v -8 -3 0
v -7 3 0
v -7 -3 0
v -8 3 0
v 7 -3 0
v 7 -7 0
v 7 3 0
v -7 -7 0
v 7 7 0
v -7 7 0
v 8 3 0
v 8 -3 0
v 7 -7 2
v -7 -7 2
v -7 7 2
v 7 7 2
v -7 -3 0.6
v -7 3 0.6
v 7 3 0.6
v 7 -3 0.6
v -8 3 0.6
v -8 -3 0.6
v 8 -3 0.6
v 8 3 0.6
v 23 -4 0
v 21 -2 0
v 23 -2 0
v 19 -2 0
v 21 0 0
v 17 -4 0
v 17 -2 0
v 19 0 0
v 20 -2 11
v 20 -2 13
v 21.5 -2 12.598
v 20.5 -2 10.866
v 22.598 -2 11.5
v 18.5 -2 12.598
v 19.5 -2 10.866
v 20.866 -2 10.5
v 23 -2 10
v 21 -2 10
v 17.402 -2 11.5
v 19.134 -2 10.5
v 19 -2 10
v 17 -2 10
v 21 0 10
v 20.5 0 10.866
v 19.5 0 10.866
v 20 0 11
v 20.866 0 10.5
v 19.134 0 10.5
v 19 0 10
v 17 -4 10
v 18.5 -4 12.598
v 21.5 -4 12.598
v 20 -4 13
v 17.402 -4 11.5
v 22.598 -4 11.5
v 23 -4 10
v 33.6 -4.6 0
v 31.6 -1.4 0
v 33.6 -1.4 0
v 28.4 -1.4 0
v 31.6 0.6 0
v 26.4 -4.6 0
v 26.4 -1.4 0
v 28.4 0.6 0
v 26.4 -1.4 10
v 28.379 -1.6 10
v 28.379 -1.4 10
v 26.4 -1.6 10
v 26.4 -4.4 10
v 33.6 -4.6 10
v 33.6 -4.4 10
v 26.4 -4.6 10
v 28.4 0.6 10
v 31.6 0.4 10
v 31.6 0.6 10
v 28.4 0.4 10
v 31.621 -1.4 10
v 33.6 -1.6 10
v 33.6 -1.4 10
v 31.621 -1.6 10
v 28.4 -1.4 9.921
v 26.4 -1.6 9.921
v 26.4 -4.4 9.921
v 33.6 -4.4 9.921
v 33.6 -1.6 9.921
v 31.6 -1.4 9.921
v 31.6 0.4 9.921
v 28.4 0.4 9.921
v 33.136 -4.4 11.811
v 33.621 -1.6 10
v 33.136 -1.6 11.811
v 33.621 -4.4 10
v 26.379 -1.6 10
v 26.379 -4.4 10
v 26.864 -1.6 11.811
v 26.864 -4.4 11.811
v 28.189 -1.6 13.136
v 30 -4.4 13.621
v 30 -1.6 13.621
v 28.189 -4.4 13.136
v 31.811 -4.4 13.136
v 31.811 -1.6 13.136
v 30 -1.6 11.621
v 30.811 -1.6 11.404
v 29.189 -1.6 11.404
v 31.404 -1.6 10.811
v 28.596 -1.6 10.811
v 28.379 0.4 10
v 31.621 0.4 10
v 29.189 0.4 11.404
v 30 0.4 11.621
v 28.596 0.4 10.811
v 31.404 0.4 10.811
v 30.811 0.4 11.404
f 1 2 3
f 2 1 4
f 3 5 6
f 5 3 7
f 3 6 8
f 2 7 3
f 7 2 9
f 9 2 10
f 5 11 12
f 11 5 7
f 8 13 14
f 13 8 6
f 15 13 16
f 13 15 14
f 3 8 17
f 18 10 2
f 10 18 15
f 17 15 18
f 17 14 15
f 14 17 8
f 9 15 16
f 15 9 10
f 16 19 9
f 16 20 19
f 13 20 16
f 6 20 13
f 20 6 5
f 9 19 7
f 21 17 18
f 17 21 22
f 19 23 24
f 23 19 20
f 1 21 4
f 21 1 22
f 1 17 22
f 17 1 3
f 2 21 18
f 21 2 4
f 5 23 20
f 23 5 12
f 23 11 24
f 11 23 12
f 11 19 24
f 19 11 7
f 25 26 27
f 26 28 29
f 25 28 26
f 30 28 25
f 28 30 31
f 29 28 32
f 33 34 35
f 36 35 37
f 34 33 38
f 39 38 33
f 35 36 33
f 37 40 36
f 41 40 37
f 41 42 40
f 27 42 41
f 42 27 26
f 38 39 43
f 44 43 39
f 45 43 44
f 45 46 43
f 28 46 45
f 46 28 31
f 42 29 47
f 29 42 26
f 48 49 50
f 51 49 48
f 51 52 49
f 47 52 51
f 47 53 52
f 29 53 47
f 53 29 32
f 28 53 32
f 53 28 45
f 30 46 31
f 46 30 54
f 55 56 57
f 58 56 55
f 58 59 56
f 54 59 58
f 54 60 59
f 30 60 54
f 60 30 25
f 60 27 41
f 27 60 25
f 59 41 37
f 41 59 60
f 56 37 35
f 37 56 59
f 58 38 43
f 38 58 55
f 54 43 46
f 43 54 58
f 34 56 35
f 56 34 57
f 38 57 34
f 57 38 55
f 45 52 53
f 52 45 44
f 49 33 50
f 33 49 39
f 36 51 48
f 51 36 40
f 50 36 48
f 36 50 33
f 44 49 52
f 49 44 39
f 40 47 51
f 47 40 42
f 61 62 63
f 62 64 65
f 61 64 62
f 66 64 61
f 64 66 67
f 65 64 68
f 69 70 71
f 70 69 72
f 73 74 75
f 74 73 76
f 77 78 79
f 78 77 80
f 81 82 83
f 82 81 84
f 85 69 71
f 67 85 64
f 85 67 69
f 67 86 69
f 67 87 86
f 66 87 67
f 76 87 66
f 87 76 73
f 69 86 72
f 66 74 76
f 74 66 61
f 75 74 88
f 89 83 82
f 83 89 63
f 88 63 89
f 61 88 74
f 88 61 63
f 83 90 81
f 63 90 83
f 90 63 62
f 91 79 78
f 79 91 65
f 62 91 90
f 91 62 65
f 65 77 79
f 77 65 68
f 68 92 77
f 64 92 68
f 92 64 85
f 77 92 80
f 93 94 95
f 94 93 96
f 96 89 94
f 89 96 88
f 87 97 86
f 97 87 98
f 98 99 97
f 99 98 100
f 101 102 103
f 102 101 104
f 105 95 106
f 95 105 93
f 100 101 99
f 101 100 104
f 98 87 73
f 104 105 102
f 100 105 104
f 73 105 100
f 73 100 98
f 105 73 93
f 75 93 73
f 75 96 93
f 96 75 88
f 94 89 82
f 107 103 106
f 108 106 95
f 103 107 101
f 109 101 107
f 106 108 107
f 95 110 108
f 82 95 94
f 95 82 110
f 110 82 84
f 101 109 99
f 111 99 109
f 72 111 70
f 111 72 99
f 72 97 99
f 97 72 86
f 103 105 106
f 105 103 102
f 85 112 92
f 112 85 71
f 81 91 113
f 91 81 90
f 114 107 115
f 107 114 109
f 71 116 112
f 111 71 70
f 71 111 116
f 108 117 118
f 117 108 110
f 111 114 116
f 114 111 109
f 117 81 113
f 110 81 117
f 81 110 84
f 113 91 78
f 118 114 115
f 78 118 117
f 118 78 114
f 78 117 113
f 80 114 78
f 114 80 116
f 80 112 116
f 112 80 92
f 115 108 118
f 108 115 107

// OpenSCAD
module keyswitch_hole(x=0, y=0, a=0) {
    translate([x, y, 0]) {
        rotate([0, 0, 90+a]) {
            linear_extrude(height = 2) {
            square([14, 14], center = true);
            //translate([-8, 3, 0]) square([1, 3]);
            //translate([-8, -6, 0]) square([1, 3]);
            //translate([7, 3, 0]) square([1, 3]);
            //translate([7, -6, 0]) square([1, 3]);
            }
            linear_extrude(height = 0.6) {
                translate([-3, 7]) square([6, 1]);
            translate([-3, -8]) square([6, 1]);
            }
        }
    }
}

keyswitch_hole();

module joint_male_face() {
    translate([-1, 0])
    square([2,4]);
    translate([-3, 2])
    square([6,2]);
}

module joint_male(pos=[0,0]) {
    translate(pos){
      rotate([0,0,180]){
        linear_extrude(height=10)
        joint_male_face();
        
        translate([0,2,10])
        rotate([-90,0,0])
        linear_extrude(height=2)
        circle(3, $fn=12);
        
        translate([0,0,10])
        rotate([-90,0,0])
        linear_extrude(height=2)
        circle(1, $fn=12);
      }
    }
}

module joint_female(pos=[0,0]) {
    delta = 0.6;
    translate(pos){
      rotate([0,0,180]){
        linear_extrude(height=10)
        offset(delta=delta)
        joint_male_face();
        
        translate([0,1.6,10])
        rotate([-90,0,0])
        linear_extrude(height=2.8)
        offset(delta=delta)
        circle(3, $fn=12);

        translate([0,-0.4,10])
        rotate([-90,0,0])
        linear_extrude(height=2.8)
        offset(delta=delta)
        circle(1, $fn=12);
      }
    }
}


joint_male([20, 0]);
joint_female([30, 0]);
